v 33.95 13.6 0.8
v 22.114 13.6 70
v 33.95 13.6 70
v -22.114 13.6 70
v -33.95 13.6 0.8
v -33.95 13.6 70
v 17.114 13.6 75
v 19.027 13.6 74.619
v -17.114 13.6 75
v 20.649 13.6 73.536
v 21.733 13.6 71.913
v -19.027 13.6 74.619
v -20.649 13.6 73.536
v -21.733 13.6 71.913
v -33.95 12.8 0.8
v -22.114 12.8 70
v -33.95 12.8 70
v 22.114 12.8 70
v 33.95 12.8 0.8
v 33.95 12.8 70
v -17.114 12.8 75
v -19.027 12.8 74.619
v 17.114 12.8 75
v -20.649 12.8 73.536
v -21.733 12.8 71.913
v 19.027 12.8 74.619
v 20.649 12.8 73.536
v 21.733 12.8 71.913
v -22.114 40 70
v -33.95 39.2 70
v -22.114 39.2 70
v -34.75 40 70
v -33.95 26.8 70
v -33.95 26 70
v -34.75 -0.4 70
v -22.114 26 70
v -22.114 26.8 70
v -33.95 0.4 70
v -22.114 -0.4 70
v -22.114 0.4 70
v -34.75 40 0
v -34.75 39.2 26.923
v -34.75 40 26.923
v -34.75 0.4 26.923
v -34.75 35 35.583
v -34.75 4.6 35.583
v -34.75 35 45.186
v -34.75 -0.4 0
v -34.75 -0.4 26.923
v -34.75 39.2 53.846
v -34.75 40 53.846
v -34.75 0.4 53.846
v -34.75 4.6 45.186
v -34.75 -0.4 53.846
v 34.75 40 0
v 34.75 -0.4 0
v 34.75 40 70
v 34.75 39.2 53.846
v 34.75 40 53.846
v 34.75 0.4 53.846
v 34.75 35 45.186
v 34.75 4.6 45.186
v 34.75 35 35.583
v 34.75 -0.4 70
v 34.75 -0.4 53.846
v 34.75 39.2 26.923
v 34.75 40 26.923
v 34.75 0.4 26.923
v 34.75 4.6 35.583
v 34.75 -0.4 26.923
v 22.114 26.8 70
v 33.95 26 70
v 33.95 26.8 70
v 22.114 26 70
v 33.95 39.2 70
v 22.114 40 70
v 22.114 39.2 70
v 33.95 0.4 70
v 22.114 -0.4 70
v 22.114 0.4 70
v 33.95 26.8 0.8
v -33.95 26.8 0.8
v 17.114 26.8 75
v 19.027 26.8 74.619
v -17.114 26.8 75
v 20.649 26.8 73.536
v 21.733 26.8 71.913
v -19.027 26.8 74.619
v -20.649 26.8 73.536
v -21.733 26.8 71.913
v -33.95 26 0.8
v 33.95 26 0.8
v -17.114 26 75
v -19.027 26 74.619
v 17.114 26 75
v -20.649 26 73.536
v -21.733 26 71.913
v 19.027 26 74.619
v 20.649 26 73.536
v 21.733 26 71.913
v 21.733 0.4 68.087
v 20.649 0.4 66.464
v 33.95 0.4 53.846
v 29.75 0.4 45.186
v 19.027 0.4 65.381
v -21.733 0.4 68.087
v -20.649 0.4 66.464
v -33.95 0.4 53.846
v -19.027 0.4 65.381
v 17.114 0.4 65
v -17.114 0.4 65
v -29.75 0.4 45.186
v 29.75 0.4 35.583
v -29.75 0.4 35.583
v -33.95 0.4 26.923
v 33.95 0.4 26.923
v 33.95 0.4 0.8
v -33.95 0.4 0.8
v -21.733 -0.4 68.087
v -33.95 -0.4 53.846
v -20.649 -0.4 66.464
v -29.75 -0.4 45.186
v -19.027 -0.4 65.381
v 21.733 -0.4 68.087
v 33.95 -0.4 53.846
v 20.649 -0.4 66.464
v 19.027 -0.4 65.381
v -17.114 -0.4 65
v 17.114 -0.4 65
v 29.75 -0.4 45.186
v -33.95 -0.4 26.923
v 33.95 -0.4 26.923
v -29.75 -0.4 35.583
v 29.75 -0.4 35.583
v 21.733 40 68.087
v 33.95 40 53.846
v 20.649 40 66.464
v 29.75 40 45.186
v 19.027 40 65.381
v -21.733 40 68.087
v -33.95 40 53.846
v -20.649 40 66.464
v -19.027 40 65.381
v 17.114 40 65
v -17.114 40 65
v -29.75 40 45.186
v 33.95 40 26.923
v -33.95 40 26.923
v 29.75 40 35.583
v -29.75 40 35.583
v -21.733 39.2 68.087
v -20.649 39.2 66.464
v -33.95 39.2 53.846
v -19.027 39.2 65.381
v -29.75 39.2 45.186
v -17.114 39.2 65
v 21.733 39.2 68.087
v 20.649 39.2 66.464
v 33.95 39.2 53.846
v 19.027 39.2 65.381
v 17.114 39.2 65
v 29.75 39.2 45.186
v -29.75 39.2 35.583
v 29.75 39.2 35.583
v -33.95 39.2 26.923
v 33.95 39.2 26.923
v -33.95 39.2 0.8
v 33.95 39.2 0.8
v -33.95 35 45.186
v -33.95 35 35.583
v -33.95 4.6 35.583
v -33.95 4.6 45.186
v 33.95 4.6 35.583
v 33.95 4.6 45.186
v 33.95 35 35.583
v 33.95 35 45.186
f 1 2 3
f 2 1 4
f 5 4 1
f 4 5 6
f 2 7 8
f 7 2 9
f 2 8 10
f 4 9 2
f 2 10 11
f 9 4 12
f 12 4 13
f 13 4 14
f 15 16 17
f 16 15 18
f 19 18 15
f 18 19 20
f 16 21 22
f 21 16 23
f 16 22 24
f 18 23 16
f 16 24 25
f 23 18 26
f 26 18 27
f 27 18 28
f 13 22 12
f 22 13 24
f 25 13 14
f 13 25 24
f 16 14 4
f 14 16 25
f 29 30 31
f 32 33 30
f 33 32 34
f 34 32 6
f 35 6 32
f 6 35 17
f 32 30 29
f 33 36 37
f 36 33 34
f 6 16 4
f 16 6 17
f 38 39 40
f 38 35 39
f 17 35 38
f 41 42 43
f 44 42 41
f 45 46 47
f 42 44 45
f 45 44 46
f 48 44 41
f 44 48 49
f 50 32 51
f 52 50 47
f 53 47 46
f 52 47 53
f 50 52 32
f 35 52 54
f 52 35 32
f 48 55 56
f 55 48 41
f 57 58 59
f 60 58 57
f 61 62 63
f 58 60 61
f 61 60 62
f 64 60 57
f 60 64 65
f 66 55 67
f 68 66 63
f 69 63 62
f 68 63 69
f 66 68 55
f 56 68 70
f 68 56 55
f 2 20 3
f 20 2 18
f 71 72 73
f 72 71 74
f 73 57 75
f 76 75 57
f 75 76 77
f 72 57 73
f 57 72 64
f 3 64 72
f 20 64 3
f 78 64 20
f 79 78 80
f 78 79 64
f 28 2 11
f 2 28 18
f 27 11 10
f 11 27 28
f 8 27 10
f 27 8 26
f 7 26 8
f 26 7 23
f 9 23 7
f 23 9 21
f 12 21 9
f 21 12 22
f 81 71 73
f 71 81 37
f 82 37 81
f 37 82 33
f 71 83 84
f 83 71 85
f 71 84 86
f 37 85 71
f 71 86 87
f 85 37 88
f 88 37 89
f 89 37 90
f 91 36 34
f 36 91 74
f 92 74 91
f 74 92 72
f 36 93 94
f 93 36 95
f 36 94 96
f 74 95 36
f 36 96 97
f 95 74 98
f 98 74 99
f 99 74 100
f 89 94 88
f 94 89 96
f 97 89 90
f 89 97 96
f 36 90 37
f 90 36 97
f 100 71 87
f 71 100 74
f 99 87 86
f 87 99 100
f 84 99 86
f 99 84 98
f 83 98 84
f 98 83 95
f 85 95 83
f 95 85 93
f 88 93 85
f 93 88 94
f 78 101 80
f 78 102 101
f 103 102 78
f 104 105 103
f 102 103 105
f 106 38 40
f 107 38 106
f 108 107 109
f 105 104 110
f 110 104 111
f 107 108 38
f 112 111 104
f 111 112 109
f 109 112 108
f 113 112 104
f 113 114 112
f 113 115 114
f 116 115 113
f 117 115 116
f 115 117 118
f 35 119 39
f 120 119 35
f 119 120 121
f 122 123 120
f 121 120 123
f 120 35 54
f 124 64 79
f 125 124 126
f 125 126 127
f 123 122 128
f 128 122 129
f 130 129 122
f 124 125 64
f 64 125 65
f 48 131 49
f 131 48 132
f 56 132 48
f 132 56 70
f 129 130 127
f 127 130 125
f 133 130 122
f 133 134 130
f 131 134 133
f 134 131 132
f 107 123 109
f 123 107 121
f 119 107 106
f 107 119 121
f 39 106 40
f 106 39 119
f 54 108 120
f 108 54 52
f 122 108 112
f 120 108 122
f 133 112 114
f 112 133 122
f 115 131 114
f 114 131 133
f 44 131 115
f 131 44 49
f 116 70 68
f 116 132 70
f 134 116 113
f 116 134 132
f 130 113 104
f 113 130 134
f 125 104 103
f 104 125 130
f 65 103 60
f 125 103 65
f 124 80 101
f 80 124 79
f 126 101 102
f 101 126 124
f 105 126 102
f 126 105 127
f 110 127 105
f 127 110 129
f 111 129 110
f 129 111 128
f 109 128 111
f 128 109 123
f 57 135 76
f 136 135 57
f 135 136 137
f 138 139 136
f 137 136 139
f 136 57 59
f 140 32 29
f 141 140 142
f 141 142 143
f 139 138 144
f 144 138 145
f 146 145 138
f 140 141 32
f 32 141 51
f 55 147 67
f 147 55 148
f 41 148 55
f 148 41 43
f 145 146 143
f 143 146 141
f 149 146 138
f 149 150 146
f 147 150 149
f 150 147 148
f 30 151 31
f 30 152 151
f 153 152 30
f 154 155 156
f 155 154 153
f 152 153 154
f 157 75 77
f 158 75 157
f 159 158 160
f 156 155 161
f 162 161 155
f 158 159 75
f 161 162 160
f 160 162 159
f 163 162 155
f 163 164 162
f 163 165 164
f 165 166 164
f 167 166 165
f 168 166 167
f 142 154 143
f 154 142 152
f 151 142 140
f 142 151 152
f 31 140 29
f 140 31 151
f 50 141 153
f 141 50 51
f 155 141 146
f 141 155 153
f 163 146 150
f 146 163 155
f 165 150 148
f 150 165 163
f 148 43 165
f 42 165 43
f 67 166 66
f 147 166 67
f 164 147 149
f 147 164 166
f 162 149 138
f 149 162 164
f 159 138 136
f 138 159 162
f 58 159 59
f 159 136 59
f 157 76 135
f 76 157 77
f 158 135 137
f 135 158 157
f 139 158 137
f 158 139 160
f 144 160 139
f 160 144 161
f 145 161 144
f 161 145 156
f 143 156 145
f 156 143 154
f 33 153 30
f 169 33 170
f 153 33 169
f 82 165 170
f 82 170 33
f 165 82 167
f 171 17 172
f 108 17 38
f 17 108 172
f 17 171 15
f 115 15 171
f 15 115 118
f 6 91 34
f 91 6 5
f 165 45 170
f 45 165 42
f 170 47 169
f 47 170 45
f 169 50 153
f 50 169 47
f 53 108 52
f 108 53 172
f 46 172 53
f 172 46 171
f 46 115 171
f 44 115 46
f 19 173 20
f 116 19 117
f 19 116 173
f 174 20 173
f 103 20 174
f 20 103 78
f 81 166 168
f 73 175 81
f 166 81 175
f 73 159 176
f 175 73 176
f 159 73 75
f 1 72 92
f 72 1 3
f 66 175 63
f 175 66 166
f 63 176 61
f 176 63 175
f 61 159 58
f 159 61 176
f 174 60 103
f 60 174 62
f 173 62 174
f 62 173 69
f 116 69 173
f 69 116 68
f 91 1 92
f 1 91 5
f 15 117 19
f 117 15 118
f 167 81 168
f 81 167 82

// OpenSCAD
/* [Box Paremeters] */
Card_thickness = 0.8; // [0.8:Dragon Shields Double Sleeved, 0.75:Ultra Pro Eclipse Double Sleeved, 0.75:Ultra Pro Eclipse Single Sleeved, 0.73:Ultimate Guard Katana Double Sleeved, 0.65:Ultimate Guard Supreme Single Sleeved ]

// Defined in number of cards. Modify this vector in the file to add more sections
Section_sizes = [15, 15, 15]; 
Section_extra_space = 0.4;

Mid_wall_style = 1; // [-1:Cutout, 1:Tab]

/* [Top cutout/tab]  */

Vertical_ratios = [2.5,2.5,1.5]; // [1:0.5:5]
Top_cut_depth = 5; // [3:1:10]

/* [Cutouts] */
Horizontal_ratios = [1,3.5,1]; // [1:0.5:5]

Side_cut_depth = 5; // [2:10]
Side_cut_angle = 60;

/* [Hidden] */
function add(v) = [for(p=v) 1]*v;
function select(vector, indices) = [ for (index = indices) vector[index] ];

box_width = 69.5;
box_height = 70;
wall_thickness = 0.8;

module box_wall(horizontal_ratios = Horizontal_ratios, vertical_ratios = Vertical_ratios, side_cut_depth = Side_cut_depth, Top_cut_depth = Top_cut_depth, h = box_height, w = box_width, Tab = Mid_wall_style){
  //Calculation helpers
  horizontal_ratios_sum = add(horizontal_ratios);
  vertical_ratios_sum = add(vertical_ratios);

  hi = vertical_ratios * h / vertical_ratios_sum;
  h1 = hi[0];
  h2 = hi[1]; 
  h3 = hi[2];

  wi = horizontal_ratios * w / horizontal_ratios_sum;
  w1 = wi[0]; 
  w2 = wi[1];
  w3 = wi[2];
  
  curve_radius = Top_cut_depth;

  // Wall points 
  bottom_left_corner = [0,0];
  
  left_cut_bottom_entrance = [0,h1];
  left_cut_bottom_entrance_flat = [wall_thickness, h1];
  left_cut_bottom_end = [side_cut_depth, h1+side_cut_depth*tan(Side_cut_angle)];
  left_cut_top_end = [side_cut_depth, h1+h2-side_cut_depth*tan(Side_cut_angle)];
  left_cut_top_entrance_flat = [wall_thickness, h1+h2];
  left_cut_top_entrance = [0, h1+h2];

  top_left_corner = [0, h];
  
  top_cut_left_entrance = [w1+curve_radius, h];
  top_cut_left_bottom = [w1+curve_radius, h+(Tab)*Top_cut_depth];
  top_cut_right_bottom = [w1+w2-curve_radius, h+(Tab)*Top_cut_depth];
  top_cut_right_entrance = [w1+w2-curve_radius, h];
  
  top_right_corner = [w, h];

  right_cut_top_entrance = [w, h1+h2];
  right_cut_top_entrance_flat = [w-wall_thickness, h1+h2];
  right_cut_top_end = [w-side_cut_depth, h1+h2-side_cut_depth*tan(Side_cut_angle)];
  right_cut_bottom_end = [w-side_cut_depth, h1+side_cut_depth*tan(Side_cut_angle)];
  right_cut_bottom_entrance_flat = [w-wall_thickness, h1];
  right_cut_bottom_entrance = [w, h1];
  
  bottom_right_corner = [w, 0];
  
  points = [
      bottom_left_corner,
      
      left_cut_bottom_entrance,
      left_cut_bottom_entrance_flat,
      left_cut_bottom_end,
      left_cut_top_end,
      left_cut_top_entrance_flat,
      left_cut_top_entrance,
      
      top_left_corner,
      
      top_cut_left_entrance,
      top_cut_left_bottom,
      top_cut_right_bottom,
      top_cut_right_entrance,
      
      top_right_corner,
      
      right_cut_top_entrance,
      right_cut_top_entrance_flat,
      right_cut_top_end,
      right_cut_bottom_end,
      right_cut_bottom_entrance_flat,
      right_cut_bottom_entrance,
      
      bottom_right_corner 
  ];
      
  if(Tab == 1){
    rotate([90,0,0])
    linear_extrude(height=wall_thickness, center=true)
    translate([-w/2, 0, -h/2])
    union() {
      polygon(points=points);
      translate(top_cut_left_entrance) circle(r = curve_radius);
      translate(top_cut_right_entrance) circle(r = curve_radius);
    }
  }

  if(Tab == -1){
    rotate([90,0,0])
    linear_extrude(height=wall_thickness, center=true)
    translate([-w/2, 0, -h/2])
    difference() {
      polygon(points=points);
      translate(top_cut_left_entrance) circle(r = curve_radius);
      translate(top_cut_right_entrance) circle(r = curve_radius);
    }
  }
}

box_depth = add(Section_sizes)*Card_thickness + len(Section_sizes) * (Section_extra_space + wall_thickness);

box_wall(Tab = -1);
for( i = [0:len(Section_sizes)-2] ) {
  mid_wall_depth = add(select(Section_sizes,[0:i])) * Card_thickness + (i+1) * (Section_extra_space+wall_thickness);
  #translate([0,mid_wall_depth,0]) box_wall(side_cut_depth = 0);
}
translate([0,box_depth,0]) box_wall(Tab=-1);

// Side walls
external_box_depth = box_depth+wall_thickness;
translate([-box_width/2+wall_thickness/2, box_depth/2, 0]) rotate([0,0,90]) box_wall(horizontal_ratios = [1,0,1] , Top_cut_depth= 0, w = external_box_depth);
translate([box_width/2-wall_thickness/2, box_depth/2, 0]) rotate([0,0,90]) box_wall(horizontal_ratios = [1,0,1], Top_cut_depth= 0, w = external_box_depth);

// Bottom
translate([-box_width/2,-wall_thickness/2,0]) cube([box_width, external_box_depth, wall_thickness]);
